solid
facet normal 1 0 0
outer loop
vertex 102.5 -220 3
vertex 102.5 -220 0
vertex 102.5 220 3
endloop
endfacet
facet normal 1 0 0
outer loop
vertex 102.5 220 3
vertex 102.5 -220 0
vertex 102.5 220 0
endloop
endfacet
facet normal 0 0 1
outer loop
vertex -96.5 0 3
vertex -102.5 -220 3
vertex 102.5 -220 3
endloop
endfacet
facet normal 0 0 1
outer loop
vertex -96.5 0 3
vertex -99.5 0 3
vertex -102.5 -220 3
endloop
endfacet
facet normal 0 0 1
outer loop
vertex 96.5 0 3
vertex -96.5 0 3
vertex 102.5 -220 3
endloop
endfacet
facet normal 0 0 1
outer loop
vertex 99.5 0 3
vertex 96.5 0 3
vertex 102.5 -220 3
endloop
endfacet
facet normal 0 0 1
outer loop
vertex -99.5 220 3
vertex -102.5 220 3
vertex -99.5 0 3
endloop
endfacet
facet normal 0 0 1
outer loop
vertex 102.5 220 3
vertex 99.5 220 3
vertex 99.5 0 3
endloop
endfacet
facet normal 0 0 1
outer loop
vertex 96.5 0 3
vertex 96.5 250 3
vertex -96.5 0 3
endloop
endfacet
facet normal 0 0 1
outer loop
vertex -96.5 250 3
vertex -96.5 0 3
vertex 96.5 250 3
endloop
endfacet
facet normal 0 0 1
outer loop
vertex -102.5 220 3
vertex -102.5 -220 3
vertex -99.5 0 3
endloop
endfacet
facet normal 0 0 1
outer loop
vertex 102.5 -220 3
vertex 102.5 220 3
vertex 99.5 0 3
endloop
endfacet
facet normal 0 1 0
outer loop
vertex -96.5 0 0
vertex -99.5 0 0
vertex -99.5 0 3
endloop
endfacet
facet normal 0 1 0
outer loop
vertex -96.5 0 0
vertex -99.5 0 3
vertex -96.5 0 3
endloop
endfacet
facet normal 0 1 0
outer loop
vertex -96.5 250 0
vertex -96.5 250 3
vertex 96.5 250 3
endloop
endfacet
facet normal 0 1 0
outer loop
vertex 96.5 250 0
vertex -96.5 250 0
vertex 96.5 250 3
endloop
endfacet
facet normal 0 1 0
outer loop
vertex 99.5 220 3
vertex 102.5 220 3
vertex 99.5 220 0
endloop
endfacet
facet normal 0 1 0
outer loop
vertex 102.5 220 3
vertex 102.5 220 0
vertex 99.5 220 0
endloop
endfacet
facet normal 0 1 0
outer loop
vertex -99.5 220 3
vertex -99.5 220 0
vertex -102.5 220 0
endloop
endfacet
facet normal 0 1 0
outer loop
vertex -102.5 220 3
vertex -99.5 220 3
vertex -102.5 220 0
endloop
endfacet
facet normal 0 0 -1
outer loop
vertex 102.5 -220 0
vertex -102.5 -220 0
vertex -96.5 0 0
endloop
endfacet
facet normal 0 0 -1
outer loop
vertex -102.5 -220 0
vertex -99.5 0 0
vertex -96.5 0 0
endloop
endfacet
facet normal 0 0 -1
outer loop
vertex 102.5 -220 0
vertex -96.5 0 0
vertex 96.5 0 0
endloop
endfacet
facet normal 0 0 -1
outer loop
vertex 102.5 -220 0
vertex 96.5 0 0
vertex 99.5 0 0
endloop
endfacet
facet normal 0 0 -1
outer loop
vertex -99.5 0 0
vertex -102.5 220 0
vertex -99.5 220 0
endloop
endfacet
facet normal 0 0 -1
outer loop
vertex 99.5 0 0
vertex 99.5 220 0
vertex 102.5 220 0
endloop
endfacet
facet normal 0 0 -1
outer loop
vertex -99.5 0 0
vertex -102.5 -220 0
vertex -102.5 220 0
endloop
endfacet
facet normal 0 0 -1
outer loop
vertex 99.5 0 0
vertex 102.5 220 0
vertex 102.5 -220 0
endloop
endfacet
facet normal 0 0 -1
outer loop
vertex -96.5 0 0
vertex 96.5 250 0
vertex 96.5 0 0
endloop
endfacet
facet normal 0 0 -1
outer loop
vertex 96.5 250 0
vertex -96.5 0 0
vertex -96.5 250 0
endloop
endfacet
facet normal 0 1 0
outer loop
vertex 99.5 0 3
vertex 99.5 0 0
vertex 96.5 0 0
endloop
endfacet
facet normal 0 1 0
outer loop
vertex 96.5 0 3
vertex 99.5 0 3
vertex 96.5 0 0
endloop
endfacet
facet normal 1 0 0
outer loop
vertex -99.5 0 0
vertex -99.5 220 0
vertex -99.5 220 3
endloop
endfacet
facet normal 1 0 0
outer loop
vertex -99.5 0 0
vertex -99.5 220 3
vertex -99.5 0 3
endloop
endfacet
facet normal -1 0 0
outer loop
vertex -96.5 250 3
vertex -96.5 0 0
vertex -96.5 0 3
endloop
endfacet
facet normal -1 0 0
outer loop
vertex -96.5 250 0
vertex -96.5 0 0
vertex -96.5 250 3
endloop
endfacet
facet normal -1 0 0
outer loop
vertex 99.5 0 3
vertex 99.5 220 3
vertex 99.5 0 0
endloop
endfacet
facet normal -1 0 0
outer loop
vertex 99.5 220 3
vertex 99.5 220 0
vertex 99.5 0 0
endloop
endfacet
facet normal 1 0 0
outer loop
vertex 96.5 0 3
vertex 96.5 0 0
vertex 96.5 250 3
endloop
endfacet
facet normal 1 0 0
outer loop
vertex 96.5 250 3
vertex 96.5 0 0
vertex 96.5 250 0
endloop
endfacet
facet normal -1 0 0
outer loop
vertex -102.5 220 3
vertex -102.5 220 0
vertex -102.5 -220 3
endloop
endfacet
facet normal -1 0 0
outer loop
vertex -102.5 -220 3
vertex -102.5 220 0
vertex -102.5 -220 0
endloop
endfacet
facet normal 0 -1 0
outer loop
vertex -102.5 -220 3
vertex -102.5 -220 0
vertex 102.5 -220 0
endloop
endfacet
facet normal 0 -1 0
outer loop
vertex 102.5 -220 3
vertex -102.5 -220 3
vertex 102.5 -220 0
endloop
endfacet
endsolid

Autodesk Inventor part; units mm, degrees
ref_plane "YZ Plane" through (0, 0, 0) normal (1, 0, 0) x (0, 1, 0)
ref_plane "XZ Plane" through (0, 0, 0) normal (0, 1, 0) x (-1, 0, 0)
ref_plane "XY Plane" through (0, 0, 0) normal (0, 0, 1) x (1, 0, 0)
sketch "Sketch1" plane through (0, 0, 0) normal (0, 0, 1) x (1, 0, 0)
  line L0 (-102.5, -220) -> (102.5, -220)
  line L1 (102.5, -220) -> (102.5, 220)
  line L2 (102.5, 220) -> (-102.5, 220)
  line L3 (-102.5, 220) -> (-102.5, -220)
  line L4 (-102.5, -220) -> (102.5, 220) construction
  line L5 (102.5, -220) -> (-102.5, 220) construction
  line L6 (-96.5, 220) -> (-99.5, 220)
  line L7 (-99.5, 220) -> (-99.5, 0)
  line L8 (-99.5, 0) -> (-96.5, 0)
  line L9 (-96.5, 0) -> (-96.5, 220)
  line L10 (0, 220) -> (0, 0)
  line L11 (99.5, 220) -> (99.5, 0)
  line L12 (99.5, 0) -> (96.5, 0)
  line L13 (96.5, 0) -> (96.5, 220)
  dimension "d0" = 205
  dimension "d1" = 440
  dimension "d2" = 3
  dimension "d3" = 3
  dimension "d4" = 220
sketch "Sketch2" plane through (0, 0, 3) normal (0, 0, 1) x (1, 0, 0)
  line L0 (-96.5, 250) -> (96.5, 250)
  line L1 (96.5, 250) -> (96.5, 220)
  line L2 (96.5, 220) -> (-96.5, 220)
  line L3 (-96.5, 220) -> (-96.5, 250)
  line L4 (-96.5, 250) -> (96.5, 220) construction
  line L5 (96.5, 250) -> (-96.5, 220) construction
  line L6 (-96.5, 220) -> (96.5, 220)
  point P0 (0, 0)
  point P1 (0, 235)
  point P2 (0, 220)
  dimension "d6" = 30
extrude "Plate1" add sketch "Sketch1" along normal blind 3 contours L3 L2 L7 L8 L9 L13 L12 L11 L1 L0
sheet face with bend "Face2" sketch "Sketch2" thickness 3 toward (0, 0, -1) bend radius 3
bend "Bend1"
equation "\"d5\" = Thickness"
equation "\"d7\" = BendRadius"
equation "\"d8\" = BendReliefWidth"
equation "\"d10\" = MinimumRemnant"
equation "\"d9\" = BendReliefDepth"
equation "\"d11\" = TransitionRadius"
equation "\"BendRadius\" = Thickness"
equation "\"BendReliefWidth\" = Thickness"
equation "\"BendReliefDepth\" = 0.5 * Thickness"
equation "\"CornerReliefSize\" = 4 * Thickness"
equation "\"MinimumRemnant\" = 2 * Thickness"
equation "\"TransitionRadius\" = BendRadius"
equation "\"JacobiRadiusSize\" = BendRadius"
equation "\"GapSize\" = Thickness"
equation "\"Thickness\" = 3"
properties part number "Finishing Sheets .4 ( Front )  Acrylic" material "PMMA Plastic"
